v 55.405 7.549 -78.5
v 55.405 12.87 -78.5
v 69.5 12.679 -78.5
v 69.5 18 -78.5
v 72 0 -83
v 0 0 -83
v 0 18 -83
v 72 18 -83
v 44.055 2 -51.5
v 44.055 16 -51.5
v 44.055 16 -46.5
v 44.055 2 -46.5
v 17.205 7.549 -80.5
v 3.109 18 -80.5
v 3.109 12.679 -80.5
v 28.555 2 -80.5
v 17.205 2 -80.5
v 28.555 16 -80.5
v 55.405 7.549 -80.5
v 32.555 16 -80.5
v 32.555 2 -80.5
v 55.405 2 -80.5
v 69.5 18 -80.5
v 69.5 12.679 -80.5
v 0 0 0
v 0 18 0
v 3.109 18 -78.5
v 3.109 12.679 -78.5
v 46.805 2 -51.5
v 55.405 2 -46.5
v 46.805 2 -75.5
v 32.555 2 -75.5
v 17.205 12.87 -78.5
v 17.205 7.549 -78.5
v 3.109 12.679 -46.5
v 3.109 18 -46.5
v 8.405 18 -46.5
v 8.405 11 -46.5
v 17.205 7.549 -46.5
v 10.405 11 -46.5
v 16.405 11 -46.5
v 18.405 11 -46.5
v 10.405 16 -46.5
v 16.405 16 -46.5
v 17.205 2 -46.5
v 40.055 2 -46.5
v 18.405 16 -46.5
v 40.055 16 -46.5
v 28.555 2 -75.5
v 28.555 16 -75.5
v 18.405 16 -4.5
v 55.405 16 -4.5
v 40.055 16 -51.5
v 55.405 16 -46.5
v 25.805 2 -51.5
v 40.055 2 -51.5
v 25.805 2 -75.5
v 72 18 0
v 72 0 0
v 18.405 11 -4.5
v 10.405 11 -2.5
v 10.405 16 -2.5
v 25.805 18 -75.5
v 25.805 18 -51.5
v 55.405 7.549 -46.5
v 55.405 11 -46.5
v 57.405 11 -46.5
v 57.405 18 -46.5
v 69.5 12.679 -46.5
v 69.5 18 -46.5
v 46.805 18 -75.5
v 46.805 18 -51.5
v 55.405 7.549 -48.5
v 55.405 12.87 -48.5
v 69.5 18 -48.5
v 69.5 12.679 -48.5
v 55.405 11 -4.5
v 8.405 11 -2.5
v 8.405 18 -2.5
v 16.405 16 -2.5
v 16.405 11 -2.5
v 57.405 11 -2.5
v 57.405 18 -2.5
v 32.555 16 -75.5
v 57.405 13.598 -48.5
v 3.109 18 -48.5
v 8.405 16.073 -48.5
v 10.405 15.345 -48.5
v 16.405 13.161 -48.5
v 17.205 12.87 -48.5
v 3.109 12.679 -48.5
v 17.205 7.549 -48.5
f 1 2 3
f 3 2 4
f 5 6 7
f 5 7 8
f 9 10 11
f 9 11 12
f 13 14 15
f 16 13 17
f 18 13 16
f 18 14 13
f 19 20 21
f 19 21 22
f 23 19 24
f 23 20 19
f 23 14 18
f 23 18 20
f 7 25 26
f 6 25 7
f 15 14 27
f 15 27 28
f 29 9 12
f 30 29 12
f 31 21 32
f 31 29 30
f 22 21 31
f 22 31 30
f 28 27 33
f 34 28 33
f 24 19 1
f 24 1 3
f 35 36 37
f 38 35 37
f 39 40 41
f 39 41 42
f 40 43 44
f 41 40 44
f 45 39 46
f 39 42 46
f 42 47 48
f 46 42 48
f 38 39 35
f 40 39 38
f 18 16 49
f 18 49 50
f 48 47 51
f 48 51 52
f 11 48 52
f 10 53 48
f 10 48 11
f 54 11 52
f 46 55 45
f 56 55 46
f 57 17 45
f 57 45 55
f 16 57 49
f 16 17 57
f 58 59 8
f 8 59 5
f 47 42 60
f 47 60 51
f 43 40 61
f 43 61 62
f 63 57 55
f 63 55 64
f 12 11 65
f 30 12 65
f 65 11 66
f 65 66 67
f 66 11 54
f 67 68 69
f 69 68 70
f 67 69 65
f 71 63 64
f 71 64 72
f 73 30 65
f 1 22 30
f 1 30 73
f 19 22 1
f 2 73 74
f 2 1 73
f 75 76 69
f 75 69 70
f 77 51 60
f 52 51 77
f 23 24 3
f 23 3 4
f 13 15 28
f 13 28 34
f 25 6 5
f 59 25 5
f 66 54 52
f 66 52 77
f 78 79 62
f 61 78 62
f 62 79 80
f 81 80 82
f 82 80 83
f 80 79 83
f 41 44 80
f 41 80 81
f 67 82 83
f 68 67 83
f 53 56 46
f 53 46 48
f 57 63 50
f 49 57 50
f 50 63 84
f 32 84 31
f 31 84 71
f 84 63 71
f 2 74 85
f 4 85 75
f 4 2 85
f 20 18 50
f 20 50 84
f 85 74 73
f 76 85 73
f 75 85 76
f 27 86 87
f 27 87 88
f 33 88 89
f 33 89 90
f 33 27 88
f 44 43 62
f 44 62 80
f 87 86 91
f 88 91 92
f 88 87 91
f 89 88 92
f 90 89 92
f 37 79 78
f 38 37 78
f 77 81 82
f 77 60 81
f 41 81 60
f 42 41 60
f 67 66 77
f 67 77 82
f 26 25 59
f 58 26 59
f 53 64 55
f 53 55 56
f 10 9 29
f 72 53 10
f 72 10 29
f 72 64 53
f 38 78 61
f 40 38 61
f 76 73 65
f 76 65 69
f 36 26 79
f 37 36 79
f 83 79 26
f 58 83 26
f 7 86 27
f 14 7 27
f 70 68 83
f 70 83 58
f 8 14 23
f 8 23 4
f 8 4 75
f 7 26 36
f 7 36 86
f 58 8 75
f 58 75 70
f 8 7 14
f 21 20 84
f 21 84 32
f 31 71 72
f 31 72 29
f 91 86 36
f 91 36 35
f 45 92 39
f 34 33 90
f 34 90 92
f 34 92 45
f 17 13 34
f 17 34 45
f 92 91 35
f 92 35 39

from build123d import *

# Parameters (mm, degrees)
SKETCH1_W           = 72
SKETCH1_H           = 83
BOSS_EXTRUDE1_DEPTH = 18
CAVITY2_START       = -80.5
CAVITY2_DEPTH       = 34
CAVITY2_START_2     = -48.5
CAVITY2_2_DEPTH     = 46
CAVITY2_3_DEPTH     = 5
CAVITY2_START_3     = -51.5
CAVITY2_4_DEPTH     = 5
CAVITY2_START_4     = -4.5
CAVITY2_5_OUTLINE_W = 37
CAVITY2_5_OUTLINE_H = 5
CAVITY2_5_DEPTH     = 2
CAVITY2_6_DEPTH     = 2
CAVITY2_7_DEPTH     = 2


# Read off the part's stored shape, not the designer's step: Cavity2
with BuildPart() as part:
    # Sketch1 → Boss-Extrude1 (new body)
    with BuildSketch(Plane(origin=(0, 0, 0), x_dir=(1, 0, 0), z_dir=(0, 1, 0))):
        with Locations((36, 41.5)):
            Rectangle(SKETCH1_W, SKETCH1_H)
    extrude(amount=BOSS_EXTRUDE1_DEPTH)

    # Cavity2 outline → Cavity2 (cut)
    with BuildSketch(Plane.XY.offset(CAVITY2_START)):
        Polygon((55.404610688, 2), (55.404610688, 12.86969785), (69.5, 18), (46.804610688, 18), (46.804610688, 2), align=None)
        Polygon((25.804610688, 18), (3.109221376, 18), (17.204610688, 12.86969785), (17.204610688, 2), (25.804610688, 2), align=None)
    extrude(amount=CAVITY2_DEPTH, mode=Mode.SUBTRACT)

    # Cavity2 2 outline → Cavity2 2 (cut)
    with BuildSketch(Plane.XY.offset(CAVITY2_START_2)):
        Polygon((55.404610688, 11), (57.404610688, 11), (57.404610688, 18), (8.404610688, 18), (8.404610688, 11), (10.404610688, 11), (10.404610688, 16), (16.404610688, 16), (16.404610688, 11), (18.404610688, 11), (18.404610688, 16), (55.404610688, 16), align=None)
    extrude(amount=CAVITY2_2_DEPTH, mode=Mode.SUBTRACT)

    # Cavity2 3 outline → Cavity2 3 (cut)
    with BuildSketch(Plane.XY.offset(CAVITY2_START)):
        Polygon((46.804610688, 2), (46.804610688, 18), (25.804610688, 18), (25.804610688, 2), (28.554610688, 2), (28.554610688, 16), (32.554610688, 16), (32.554610688, 2), align=None)
    extrude(amount=CAVITY2_3_DEPTH, mode=Mode.SUBTRACT)

    # Cavity2 4 outline → Cavity2 4 (cut)
    with BuildSketch(Plane.XY.offset(CAVITY2_START_3)):
        Polygon((46.804610688, 2), (46.804610688, 18), (25.804610688, 18), (25.804610688, 2), (40.054610688, 2), (40.054610688, 16), (44.054610688, 16), (44.054610688, 2), align=None)
    extrude(amount=CAVITY2_4_DEPTH, mode=Mode.SUBTRACT)

    # Cavity2 5 outline → Cavity2 5 (cut)
    with BuildSketch(Plane.XY.offset(CAVITY2_START_4)):
        with Locations((36.904610688, 13.5)):
            Rectangle(CAVITY2_5_OUTLINE_W, CAVITY2_5_OUTLINE_H)
    extrude(amount=CAVITY2_5_DEPTH, mode=Mode.SUBTRACT)

    # Cavity2 6 outline → Cavity2 6 (cut)
    with BuildSketch(Plane.XY.offset(CAVITY2_START)):
        Polygon((55.404610688, 7.548808988), (69.5, 12.679111138), (69.5, 18), (55.404610688, 12.86969785), align=None)
        Polygon((3.109221376, 18), (3.109221376, 12.679111138), (17.204610688, 7.548808988), (17.204610688, 12.86969785), align=None)
    extrude(amount=CAVITY2_6_DEPTH, mode=Mode.SUBTRACT)

    # Cavity2 7 outline → Cavity2 7 (cut)
    with BuildSketch(Plane.XY.offset(CAVITY2_START_2)):
        Polygon((55.404610688, 7.548808988), (69.5, 12.679111138), (69.5, 18), (57.404610688, 13.597638319), (57.404610688, 11), (55.404610688, 11), align=None)
        Polygon((8.404610688, 11), (8.404610688, 16.072635912), (3.109221376, 18), (3.109221376, 12.679111138), (17.204610688, 7.548808988), (17.204610688, 11), (16.404610688, 11), (16.404610688, 13.160874037), (10.404610688, 15.344695443), (10.404610688, 11), align=None)
    extrude(amount=CAVITY2_7_DEPTH, mode=Mode.SUBTRACT)


solid = part.part
